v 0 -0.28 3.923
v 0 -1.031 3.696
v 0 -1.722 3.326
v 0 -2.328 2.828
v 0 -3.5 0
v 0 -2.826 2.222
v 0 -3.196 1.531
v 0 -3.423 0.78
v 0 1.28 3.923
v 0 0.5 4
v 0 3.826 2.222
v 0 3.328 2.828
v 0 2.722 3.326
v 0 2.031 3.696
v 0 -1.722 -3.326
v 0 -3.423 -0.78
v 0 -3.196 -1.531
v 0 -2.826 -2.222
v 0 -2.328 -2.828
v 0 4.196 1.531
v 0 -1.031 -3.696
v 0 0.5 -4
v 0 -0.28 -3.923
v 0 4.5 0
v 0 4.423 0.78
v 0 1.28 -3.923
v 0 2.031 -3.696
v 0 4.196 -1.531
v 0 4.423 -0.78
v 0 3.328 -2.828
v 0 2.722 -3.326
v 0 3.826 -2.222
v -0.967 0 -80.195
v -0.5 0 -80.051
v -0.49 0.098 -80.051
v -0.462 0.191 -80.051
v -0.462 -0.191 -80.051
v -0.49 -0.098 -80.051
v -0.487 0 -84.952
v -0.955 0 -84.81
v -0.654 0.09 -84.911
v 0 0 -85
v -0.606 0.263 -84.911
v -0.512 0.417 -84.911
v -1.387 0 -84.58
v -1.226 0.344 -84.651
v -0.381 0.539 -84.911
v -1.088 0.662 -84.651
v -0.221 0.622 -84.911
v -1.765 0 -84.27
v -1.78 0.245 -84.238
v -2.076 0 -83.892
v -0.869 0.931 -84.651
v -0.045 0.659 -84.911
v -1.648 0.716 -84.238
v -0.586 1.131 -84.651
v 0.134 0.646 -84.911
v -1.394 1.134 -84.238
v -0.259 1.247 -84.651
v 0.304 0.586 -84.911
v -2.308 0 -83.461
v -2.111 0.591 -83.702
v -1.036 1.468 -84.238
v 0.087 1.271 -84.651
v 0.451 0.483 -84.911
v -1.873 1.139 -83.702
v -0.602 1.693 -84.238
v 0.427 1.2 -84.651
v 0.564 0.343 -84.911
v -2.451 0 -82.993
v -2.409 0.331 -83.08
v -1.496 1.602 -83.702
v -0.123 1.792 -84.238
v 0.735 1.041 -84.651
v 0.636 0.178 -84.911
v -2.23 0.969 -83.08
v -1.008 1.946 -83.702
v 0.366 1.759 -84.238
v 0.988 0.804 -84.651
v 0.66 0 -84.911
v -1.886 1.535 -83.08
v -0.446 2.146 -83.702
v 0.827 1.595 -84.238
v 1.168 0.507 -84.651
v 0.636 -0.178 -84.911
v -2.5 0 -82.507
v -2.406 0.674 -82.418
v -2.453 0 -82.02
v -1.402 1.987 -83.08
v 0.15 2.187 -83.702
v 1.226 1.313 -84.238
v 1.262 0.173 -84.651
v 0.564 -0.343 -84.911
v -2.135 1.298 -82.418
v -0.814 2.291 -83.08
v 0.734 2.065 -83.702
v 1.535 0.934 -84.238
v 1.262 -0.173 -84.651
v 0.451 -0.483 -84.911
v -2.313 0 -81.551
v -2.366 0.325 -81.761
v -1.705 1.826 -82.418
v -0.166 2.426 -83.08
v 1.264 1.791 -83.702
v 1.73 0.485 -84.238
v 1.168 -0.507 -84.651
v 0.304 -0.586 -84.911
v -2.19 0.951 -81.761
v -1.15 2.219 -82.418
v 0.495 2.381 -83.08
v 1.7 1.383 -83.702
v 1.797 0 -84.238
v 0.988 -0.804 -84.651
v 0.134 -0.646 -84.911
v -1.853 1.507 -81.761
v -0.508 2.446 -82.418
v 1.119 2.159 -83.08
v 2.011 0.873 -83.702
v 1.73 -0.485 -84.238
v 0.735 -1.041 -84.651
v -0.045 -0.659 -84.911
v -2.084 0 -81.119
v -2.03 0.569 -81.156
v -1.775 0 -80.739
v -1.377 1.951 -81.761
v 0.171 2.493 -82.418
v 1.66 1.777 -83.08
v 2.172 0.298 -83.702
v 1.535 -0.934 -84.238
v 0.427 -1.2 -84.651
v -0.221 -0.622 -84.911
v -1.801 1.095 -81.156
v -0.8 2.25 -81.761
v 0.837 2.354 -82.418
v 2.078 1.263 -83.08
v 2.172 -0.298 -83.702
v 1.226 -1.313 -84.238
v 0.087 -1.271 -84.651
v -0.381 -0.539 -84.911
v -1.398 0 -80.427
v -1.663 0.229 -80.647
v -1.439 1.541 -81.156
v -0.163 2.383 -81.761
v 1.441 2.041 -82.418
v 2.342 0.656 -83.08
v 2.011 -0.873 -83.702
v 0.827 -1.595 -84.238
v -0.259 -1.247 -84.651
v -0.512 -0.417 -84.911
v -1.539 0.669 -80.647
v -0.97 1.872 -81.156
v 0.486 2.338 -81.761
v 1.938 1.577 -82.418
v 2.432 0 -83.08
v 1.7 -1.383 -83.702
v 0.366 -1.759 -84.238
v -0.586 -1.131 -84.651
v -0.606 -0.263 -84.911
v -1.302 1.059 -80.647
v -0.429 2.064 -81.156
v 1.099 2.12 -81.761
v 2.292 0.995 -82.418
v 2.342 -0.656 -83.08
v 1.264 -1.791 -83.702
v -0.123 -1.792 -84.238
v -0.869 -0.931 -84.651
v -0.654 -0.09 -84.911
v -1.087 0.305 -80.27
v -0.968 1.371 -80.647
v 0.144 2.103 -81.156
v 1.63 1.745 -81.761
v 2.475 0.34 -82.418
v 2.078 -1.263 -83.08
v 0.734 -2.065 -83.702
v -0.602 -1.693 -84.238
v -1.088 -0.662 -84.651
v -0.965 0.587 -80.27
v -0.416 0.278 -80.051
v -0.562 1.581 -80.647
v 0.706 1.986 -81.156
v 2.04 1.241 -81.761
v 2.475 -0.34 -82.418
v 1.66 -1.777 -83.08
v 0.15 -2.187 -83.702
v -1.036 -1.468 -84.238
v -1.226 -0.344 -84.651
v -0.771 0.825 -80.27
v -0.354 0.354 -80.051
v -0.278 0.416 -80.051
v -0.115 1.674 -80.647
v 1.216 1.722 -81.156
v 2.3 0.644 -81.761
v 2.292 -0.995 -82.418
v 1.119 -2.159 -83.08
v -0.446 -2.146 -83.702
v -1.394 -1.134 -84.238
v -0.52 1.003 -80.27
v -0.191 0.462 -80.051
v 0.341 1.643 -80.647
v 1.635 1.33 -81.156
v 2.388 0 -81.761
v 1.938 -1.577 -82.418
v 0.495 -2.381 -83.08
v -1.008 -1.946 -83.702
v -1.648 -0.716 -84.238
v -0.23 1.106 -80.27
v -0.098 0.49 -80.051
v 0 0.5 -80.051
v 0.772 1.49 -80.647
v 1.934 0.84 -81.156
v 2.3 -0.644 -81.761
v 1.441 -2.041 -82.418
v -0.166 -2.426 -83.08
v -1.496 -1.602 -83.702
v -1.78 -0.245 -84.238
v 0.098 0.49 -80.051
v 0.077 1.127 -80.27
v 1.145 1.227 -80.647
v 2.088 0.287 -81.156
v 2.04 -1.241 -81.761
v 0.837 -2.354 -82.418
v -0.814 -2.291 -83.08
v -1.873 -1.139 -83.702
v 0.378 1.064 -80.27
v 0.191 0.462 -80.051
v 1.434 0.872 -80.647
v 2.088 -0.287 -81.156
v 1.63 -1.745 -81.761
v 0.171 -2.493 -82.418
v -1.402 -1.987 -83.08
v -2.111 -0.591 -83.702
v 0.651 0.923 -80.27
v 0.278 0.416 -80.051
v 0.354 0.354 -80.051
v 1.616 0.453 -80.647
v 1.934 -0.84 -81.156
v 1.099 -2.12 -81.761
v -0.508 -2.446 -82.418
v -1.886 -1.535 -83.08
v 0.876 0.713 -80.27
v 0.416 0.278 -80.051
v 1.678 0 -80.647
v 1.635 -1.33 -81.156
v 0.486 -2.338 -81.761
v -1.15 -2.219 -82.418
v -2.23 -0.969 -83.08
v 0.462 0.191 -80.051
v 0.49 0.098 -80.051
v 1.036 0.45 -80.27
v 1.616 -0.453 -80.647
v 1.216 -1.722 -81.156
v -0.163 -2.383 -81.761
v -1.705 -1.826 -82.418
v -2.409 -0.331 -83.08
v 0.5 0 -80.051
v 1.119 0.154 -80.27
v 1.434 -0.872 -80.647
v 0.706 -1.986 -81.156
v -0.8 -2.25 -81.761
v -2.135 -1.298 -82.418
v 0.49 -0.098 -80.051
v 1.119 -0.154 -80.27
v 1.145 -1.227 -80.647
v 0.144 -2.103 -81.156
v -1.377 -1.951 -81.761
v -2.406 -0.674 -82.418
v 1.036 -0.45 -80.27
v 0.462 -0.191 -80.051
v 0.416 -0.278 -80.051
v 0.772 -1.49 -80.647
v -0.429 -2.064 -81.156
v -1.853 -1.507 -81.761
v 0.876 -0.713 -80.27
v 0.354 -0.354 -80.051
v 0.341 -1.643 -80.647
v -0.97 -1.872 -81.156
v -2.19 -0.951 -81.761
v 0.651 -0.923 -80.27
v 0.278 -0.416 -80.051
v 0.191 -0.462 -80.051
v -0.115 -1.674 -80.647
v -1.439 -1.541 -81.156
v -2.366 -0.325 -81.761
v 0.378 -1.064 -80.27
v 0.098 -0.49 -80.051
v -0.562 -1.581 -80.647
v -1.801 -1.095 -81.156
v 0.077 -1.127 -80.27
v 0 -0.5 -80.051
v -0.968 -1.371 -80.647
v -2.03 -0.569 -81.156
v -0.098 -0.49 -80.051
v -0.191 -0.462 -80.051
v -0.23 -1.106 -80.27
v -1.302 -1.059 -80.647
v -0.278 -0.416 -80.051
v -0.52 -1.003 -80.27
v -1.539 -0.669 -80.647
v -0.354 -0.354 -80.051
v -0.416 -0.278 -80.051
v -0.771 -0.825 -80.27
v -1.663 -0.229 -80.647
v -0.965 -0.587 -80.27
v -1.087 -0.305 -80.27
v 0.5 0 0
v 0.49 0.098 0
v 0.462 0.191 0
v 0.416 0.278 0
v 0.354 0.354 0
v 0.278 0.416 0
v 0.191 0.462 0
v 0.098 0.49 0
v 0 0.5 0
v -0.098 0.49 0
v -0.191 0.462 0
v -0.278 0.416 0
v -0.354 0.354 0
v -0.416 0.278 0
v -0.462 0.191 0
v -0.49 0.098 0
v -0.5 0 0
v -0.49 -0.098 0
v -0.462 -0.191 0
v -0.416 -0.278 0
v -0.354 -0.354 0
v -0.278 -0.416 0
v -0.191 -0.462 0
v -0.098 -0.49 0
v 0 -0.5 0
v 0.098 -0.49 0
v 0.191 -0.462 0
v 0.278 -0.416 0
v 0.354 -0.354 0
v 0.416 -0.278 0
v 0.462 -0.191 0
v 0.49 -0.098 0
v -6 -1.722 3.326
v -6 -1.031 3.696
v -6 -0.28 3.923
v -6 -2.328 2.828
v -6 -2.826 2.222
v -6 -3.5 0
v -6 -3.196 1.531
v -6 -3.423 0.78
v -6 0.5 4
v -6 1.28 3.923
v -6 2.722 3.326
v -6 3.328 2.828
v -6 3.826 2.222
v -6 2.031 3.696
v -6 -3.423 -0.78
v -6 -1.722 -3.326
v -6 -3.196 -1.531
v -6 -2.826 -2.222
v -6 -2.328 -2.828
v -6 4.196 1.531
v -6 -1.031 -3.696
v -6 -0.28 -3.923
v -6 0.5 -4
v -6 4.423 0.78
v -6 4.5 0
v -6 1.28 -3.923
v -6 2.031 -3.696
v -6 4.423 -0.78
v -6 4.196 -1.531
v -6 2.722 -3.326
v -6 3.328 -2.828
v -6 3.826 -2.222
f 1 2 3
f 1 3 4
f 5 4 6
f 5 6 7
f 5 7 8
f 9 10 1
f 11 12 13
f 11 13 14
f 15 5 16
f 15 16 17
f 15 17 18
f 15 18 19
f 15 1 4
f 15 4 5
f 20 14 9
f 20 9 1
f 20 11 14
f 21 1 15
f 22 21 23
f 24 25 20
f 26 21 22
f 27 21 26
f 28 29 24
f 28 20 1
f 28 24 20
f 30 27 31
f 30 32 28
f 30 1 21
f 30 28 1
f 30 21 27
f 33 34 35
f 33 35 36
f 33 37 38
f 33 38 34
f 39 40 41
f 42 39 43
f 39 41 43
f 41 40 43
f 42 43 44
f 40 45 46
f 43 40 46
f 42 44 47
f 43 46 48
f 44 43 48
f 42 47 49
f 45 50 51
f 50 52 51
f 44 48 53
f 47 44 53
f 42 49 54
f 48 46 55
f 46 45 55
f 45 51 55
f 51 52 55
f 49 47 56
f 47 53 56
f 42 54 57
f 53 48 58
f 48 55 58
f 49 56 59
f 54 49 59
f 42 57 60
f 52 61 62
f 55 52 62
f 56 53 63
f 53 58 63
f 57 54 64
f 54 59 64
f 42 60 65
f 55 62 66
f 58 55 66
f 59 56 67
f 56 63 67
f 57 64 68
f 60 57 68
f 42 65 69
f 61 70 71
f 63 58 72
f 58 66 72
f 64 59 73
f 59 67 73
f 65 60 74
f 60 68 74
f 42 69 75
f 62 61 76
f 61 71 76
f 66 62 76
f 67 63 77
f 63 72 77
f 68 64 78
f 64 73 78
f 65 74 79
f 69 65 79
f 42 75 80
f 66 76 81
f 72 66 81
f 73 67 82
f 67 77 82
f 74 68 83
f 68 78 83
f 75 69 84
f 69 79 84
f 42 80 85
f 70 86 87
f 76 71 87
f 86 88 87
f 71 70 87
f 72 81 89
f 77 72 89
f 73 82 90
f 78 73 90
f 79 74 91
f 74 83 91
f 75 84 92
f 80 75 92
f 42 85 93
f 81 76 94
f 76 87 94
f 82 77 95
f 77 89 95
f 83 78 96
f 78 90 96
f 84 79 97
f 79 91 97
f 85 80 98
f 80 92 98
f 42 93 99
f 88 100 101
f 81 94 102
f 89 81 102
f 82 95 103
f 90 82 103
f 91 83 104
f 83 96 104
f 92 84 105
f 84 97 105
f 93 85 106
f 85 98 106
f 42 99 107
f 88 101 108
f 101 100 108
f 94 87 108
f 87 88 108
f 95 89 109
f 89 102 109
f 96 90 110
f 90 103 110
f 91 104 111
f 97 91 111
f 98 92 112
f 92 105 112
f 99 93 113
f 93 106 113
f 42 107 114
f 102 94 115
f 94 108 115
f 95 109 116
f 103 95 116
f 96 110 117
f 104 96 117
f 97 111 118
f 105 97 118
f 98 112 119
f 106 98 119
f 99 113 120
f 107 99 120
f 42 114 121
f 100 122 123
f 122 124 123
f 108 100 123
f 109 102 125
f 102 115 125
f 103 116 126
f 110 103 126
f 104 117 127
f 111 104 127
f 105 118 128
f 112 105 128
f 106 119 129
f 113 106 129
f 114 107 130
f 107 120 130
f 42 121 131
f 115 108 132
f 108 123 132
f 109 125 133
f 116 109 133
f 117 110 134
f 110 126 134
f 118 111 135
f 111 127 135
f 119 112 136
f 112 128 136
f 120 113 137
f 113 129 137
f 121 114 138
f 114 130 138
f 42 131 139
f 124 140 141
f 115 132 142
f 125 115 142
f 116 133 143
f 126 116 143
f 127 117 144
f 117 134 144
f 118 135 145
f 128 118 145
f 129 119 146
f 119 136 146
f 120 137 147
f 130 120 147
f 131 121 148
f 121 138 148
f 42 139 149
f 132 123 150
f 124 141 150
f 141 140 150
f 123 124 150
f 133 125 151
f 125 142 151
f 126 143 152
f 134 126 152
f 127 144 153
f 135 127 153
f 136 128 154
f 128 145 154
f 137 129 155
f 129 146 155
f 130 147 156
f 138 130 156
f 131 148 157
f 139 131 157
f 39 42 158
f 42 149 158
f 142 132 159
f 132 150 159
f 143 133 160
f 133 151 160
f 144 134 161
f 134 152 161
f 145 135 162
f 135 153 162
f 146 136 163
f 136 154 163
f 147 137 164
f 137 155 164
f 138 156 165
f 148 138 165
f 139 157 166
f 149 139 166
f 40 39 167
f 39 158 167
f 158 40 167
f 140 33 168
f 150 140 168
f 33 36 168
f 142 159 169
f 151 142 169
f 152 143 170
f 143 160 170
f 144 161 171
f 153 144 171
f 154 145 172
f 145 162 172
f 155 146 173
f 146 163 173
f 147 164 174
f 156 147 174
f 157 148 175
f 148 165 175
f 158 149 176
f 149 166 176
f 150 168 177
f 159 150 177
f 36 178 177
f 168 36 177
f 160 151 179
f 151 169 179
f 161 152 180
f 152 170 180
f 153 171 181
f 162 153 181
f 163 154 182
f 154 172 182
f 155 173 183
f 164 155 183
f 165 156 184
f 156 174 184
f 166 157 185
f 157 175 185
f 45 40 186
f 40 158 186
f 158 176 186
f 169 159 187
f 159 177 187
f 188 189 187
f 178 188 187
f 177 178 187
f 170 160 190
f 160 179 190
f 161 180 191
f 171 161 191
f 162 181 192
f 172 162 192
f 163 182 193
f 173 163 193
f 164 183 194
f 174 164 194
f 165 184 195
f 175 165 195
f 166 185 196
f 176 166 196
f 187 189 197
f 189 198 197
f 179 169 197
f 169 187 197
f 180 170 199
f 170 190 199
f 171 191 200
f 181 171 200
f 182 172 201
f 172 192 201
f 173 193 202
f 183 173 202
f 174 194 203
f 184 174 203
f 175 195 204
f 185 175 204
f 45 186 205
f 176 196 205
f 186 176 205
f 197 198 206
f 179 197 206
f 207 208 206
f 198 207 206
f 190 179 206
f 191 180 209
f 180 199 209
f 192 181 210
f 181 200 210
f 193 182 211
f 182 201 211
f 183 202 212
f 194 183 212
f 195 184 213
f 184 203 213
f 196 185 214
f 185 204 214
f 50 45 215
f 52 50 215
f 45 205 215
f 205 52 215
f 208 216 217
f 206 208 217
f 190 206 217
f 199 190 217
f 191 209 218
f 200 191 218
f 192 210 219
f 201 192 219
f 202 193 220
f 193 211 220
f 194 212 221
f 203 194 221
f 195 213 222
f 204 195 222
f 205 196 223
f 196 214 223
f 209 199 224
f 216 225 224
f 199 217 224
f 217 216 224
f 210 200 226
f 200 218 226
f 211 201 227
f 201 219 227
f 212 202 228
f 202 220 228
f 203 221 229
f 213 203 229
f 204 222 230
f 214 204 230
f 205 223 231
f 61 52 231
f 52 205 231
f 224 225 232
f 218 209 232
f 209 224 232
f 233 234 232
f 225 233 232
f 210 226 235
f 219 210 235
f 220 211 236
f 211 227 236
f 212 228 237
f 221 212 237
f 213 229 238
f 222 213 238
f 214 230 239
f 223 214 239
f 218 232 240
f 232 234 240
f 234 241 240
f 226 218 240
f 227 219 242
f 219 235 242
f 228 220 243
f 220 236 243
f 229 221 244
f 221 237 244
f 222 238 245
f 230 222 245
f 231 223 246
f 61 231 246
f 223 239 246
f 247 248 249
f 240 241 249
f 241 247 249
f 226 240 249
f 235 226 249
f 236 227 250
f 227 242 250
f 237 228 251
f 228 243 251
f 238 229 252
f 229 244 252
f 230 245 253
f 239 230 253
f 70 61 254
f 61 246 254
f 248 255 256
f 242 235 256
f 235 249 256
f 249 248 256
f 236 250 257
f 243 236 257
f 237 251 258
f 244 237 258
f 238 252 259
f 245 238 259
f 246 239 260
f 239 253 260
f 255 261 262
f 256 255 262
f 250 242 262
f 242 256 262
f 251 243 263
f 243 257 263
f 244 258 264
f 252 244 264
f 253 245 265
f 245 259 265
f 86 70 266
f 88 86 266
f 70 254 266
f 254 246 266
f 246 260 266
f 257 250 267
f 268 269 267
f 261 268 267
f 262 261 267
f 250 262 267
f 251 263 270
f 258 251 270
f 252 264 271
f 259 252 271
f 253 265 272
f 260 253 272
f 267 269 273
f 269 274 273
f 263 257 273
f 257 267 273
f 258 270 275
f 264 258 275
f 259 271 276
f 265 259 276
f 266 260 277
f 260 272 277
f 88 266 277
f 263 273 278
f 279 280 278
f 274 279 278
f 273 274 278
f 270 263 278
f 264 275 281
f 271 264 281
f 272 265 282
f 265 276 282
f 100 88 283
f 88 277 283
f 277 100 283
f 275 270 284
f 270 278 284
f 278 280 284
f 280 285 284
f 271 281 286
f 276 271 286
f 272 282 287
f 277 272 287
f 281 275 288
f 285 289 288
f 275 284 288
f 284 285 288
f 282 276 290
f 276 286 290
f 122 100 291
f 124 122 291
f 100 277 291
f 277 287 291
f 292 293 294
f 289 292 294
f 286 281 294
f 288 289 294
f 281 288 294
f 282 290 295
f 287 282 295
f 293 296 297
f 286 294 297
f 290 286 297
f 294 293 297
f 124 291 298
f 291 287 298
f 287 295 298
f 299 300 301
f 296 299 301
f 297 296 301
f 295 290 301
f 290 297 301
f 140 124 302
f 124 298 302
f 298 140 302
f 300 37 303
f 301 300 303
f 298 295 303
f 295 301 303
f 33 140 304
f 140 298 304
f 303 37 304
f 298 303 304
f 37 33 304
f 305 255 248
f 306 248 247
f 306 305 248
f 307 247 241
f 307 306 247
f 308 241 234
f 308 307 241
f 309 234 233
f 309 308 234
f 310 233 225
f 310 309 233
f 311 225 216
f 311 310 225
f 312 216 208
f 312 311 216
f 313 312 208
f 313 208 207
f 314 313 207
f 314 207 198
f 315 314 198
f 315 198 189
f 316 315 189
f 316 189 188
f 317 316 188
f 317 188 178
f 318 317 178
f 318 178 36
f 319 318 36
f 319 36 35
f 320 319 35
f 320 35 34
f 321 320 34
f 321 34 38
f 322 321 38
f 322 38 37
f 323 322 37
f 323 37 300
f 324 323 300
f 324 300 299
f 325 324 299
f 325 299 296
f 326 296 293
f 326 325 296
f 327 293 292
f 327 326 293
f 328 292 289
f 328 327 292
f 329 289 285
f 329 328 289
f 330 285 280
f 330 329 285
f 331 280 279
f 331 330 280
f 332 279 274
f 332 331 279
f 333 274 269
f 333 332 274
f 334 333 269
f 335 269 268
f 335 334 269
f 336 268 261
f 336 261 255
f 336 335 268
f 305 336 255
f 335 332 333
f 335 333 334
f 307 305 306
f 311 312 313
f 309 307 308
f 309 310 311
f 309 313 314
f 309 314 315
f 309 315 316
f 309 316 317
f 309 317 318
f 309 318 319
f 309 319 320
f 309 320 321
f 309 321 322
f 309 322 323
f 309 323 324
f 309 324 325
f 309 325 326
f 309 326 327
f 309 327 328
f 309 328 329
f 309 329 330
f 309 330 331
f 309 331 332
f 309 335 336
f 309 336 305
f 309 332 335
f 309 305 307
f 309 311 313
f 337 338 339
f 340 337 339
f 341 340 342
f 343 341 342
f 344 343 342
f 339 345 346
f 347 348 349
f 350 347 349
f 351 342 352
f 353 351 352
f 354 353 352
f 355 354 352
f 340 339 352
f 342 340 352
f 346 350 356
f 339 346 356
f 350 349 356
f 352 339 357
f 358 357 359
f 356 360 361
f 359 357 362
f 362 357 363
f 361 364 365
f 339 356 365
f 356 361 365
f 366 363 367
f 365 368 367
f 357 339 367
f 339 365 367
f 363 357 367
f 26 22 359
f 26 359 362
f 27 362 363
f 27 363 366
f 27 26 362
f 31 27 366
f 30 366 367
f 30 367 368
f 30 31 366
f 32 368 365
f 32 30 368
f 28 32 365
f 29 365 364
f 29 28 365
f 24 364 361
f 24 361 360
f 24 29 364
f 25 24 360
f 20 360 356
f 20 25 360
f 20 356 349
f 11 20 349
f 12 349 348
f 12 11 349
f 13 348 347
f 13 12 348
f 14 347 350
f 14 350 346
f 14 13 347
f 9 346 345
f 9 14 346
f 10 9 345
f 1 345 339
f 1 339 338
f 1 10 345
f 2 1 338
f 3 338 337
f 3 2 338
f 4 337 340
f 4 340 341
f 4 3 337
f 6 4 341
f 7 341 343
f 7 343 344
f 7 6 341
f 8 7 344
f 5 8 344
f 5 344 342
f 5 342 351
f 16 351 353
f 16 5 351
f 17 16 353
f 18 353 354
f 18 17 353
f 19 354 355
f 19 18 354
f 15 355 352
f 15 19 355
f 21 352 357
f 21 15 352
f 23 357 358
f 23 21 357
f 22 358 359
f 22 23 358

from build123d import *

# Parameters (mm, degrees)
RESSALTO_EXTRUS_O1_REACH      = 87.073
RESSALTO_EXTRUS_O1_END_RADIUS = 2.5
ESBO_O4_R                     = 0.5
SMLINK_PSI_CIRCLE_R           = 4
SMLINK_PSI_CYLINDER_DEPTH     = 6


with BuildPart() as part:
    # Esboço3 → Revolução1 (revolve)
    with BuildSketch(Plane(origin=(0, 0, 0), x_dir=(-1, 0, 0), z_dir=(0, 1, 0))):
        with BuildLine():
            Line((0, -80), (0, -85))
            ThreePointArc((0, -85), (2.5, -82.5), (0, -80))
        make_face()
    revolve(axis=Axis((0, 0, -80), (0, 0, -1)))

    # Ressalto-extrusão1: up to this sphere (the profile starts outside it)
    ressalto_extrus_o1_end = Location((0, 0, -82.5)) * Sphere(RESSALTO_EXTRUS_O1_END_RADIUS, mode=Mode.PRIVATE)
    # Esboço4 → Ressalto-extrusão1 (add, up to the surface)
    with BuildSketch(Plane(origin=(0, 0, 0), x_dir=(0, 1, 0), z_dir=(0, 0, 1)), mode=Mode.PRIVATE) as ressalto_extrus_o1_sk1:
        with Locations(Location((0, 0, 0), (0, 0, 270))):
            Circle(ESBO_O4_R)
    ressalto_extrus_o1_tool1 = extrude(ressalto_extrus_o1_sk1.sketch, amount=-RESSALTO_EXTRUS_O1_REACH, mode=Mode.PRIVATE) - ressalto_extrus_o1_end
    add(ressalto_extrus_o1_tool1.solids().sort_by_distance((0, 0, 0))[0])


with BuildPart() as body_2:
    # SMLINK_PSI_CIRCLE → SMLINK_PSI_CYLINDER (new body)
    with BuildSketch(Plane(origin=(0, 0, 0), x_dir=(0, 0, -1), z_dir=(1, 0, 0))):
        with Locations((0, 0.5)):
            Circle(SMLINK_PSI_CIRCLE_R)
    extrude(amount=-SMLINK_PSI_CYLINDER_DEPTH)


solid = Compound([part.part, body_2.part])
